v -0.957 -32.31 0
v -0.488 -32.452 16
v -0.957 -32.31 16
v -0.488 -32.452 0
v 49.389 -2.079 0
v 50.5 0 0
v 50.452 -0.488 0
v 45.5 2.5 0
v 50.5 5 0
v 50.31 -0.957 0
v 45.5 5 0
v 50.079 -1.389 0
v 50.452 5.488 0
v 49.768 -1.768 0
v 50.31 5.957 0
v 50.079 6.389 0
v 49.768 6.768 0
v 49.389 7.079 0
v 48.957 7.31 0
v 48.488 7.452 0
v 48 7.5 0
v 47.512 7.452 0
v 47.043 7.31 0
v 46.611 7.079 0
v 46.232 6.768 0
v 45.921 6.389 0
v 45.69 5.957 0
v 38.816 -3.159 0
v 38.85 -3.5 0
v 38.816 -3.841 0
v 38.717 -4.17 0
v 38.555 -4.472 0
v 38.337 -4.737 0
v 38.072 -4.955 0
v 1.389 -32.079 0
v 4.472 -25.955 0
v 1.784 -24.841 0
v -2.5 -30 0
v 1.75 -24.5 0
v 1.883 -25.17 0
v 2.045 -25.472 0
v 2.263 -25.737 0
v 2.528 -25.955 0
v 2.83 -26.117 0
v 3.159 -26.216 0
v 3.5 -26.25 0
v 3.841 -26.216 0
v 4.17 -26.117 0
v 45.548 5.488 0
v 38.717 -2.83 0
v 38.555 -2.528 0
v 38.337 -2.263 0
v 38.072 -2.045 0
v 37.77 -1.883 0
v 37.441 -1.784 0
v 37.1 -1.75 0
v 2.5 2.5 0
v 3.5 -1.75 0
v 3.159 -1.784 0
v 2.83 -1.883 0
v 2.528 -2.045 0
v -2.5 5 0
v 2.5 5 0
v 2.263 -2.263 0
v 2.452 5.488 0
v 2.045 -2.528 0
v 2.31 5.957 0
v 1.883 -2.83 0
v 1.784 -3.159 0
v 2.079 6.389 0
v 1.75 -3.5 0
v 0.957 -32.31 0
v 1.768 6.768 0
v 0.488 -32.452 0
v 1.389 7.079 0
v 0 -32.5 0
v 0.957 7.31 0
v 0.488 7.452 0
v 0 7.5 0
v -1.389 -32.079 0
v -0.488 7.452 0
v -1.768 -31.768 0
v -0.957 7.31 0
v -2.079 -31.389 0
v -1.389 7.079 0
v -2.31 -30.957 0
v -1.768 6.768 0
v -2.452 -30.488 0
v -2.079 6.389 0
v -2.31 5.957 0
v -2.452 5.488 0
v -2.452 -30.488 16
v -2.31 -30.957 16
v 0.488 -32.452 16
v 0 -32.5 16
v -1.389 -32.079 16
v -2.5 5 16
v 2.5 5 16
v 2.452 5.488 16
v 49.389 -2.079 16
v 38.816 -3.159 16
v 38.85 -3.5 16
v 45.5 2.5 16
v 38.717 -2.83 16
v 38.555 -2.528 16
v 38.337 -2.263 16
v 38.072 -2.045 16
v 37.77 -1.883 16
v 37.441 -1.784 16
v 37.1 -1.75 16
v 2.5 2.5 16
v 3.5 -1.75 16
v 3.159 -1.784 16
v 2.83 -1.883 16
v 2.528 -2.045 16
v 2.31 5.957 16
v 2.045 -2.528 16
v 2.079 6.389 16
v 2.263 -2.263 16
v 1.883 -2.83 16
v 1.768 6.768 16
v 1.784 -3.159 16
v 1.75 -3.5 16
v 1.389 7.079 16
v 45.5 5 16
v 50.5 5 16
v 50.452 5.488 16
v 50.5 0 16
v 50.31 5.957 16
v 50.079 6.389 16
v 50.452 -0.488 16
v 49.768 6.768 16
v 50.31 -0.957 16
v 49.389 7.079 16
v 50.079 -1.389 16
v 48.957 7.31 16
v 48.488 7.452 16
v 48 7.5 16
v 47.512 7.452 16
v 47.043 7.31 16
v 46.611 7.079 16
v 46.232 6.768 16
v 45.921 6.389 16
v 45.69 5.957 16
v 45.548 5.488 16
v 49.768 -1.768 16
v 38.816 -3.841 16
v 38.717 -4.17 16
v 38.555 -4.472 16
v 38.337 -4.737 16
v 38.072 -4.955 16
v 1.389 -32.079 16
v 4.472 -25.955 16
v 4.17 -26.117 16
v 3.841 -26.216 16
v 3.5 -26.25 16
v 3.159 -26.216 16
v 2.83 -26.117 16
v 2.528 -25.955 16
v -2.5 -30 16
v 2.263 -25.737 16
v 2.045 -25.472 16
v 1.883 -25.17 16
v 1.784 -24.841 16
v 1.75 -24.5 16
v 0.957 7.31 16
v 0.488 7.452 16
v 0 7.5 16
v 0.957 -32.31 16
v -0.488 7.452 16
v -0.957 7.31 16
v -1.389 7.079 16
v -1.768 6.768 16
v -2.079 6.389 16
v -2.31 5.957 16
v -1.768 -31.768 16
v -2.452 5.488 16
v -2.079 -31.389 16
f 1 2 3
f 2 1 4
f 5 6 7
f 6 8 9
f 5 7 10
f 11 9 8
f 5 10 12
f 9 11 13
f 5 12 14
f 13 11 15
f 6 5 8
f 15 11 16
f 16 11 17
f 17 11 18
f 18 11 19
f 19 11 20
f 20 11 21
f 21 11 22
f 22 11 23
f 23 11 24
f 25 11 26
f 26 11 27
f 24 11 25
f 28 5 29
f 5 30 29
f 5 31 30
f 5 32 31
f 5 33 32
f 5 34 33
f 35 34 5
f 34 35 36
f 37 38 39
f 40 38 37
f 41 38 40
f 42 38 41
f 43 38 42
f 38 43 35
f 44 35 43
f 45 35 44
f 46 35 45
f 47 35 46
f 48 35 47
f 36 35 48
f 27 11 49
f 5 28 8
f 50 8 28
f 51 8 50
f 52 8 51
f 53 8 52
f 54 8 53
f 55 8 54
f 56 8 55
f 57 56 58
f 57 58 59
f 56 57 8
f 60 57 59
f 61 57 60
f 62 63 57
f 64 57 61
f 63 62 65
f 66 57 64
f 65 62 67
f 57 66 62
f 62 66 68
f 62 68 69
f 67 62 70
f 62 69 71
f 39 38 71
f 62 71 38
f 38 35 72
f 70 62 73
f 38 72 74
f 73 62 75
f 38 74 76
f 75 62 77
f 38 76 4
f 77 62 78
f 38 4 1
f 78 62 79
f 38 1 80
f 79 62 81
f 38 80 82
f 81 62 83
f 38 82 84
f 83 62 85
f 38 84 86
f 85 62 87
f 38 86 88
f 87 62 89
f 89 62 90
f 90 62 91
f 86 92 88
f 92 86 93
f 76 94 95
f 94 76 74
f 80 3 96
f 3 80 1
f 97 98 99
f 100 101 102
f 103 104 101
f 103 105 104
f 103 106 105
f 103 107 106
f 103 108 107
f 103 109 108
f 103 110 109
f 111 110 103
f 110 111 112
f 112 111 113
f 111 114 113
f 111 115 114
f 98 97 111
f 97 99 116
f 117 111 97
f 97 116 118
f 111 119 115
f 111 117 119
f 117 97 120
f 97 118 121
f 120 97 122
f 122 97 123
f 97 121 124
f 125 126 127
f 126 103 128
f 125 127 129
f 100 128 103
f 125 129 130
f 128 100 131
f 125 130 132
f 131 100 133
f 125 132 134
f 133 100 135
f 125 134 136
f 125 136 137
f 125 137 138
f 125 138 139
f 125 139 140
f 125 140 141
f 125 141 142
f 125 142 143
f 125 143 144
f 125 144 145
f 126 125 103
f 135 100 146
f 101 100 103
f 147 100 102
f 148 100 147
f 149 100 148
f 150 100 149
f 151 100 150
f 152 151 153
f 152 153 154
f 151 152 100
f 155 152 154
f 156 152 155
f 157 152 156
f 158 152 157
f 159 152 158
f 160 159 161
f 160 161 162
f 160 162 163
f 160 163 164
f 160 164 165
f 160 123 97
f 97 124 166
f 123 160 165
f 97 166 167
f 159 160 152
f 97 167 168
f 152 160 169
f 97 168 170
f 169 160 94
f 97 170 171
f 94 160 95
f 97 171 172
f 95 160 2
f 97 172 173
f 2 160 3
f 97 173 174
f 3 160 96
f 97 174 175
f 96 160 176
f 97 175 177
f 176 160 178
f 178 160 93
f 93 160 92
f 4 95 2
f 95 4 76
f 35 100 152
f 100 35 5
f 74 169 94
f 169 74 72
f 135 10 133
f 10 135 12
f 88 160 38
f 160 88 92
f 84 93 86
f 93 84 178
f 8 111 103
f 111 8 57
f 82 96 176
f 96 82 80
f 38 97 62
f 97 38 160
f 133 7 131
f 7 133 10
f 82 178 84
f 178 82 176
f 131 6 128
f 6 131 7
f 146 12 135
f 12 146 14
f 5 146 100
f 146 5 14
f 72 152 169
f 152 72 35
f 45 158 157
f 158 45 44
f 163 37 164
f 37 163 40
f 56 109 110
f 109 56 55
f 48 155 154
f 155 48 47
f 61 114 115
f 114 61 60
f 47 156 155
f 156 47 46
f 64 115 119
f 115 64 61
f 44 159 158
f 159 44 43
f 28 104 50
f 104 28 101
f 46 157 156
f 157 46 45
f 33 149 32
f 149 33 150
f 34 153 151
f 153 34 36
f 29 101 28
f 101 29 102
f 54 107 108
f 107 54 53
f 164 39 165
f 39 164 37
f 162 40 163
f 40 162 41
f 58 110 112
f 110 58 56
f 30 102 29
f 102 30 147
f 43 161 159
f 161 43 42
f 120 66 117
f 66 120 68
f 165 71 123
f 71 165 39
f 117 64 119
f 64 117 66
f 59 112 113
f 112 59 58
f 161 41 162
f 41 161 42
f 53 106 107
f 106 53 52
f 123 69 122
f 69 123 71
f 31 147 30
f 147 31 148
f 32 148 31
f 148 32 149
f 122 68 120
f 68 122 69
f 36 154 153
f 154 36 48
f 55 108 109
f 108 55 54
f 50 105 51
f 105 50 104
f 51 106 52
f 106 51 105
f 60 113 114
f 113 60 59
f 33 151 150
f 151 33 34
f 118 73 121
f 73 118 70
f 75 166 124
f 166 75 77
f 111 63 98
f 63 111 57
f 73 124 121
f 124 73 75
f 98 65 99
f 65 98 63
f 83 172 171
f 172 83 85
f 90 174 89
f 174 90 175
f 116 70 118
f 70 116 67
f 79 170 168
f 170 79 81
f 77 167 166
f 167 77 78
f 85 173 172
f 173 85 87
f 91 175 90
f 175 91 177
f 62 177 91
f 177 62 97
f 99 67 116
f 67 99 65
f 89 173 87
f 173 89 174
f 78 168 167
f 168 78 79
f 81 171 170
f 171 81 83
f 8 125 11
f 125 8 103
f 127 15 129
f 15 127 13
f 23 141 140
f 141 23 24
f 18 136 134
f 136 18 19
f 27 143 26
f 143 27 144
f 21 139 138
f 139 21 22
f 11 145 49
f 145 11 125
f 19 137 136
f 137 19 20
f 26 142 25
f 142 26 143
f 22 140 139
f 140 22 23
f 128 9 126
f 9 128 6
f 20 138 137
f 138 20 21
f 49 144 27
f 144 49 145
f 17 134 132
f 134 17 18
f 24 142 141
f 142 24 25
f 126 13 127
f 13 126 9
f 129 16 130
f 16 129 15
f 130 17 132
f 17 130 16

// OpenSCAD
$fn=32;

module main_body() {
  translate([0,-30,0])
  hull() 
  {
    cylinder(d=5, h=16);
    translate([0,30,0]) cylinder(d=5, h=16);
   // translate([0,35,0]) cylinder(d=5, h=16);
    // translate([48,35,0]) cylinder(d=5, h=16);
    translate([48,30,0]) cylinder(d=5, h=16);
  }
}

difference() {
  // Main body
  main_body();
  translate([3.5,-3.5,-0.1]) scale([0.7,0.7,1.1]) main_body();
}

  // Upper cutout
  hull()
  {
    translate([0,0,0]) cylinder(d=5, h=16);
    translate([0,5,0]) cylinder(d=5, h=16);
  }

  hull()
  {
    translate([48,0,0]) cylinder(d=5, h=16);
    translate([48,5,0]) cylinder(d=5, h=16);
  }

  *hull()
  {
    translate([-20,5,0]) cylinder(d=5, h=16);
    translate([0,5,0]) cylinder(d=5, h=16);
  }
